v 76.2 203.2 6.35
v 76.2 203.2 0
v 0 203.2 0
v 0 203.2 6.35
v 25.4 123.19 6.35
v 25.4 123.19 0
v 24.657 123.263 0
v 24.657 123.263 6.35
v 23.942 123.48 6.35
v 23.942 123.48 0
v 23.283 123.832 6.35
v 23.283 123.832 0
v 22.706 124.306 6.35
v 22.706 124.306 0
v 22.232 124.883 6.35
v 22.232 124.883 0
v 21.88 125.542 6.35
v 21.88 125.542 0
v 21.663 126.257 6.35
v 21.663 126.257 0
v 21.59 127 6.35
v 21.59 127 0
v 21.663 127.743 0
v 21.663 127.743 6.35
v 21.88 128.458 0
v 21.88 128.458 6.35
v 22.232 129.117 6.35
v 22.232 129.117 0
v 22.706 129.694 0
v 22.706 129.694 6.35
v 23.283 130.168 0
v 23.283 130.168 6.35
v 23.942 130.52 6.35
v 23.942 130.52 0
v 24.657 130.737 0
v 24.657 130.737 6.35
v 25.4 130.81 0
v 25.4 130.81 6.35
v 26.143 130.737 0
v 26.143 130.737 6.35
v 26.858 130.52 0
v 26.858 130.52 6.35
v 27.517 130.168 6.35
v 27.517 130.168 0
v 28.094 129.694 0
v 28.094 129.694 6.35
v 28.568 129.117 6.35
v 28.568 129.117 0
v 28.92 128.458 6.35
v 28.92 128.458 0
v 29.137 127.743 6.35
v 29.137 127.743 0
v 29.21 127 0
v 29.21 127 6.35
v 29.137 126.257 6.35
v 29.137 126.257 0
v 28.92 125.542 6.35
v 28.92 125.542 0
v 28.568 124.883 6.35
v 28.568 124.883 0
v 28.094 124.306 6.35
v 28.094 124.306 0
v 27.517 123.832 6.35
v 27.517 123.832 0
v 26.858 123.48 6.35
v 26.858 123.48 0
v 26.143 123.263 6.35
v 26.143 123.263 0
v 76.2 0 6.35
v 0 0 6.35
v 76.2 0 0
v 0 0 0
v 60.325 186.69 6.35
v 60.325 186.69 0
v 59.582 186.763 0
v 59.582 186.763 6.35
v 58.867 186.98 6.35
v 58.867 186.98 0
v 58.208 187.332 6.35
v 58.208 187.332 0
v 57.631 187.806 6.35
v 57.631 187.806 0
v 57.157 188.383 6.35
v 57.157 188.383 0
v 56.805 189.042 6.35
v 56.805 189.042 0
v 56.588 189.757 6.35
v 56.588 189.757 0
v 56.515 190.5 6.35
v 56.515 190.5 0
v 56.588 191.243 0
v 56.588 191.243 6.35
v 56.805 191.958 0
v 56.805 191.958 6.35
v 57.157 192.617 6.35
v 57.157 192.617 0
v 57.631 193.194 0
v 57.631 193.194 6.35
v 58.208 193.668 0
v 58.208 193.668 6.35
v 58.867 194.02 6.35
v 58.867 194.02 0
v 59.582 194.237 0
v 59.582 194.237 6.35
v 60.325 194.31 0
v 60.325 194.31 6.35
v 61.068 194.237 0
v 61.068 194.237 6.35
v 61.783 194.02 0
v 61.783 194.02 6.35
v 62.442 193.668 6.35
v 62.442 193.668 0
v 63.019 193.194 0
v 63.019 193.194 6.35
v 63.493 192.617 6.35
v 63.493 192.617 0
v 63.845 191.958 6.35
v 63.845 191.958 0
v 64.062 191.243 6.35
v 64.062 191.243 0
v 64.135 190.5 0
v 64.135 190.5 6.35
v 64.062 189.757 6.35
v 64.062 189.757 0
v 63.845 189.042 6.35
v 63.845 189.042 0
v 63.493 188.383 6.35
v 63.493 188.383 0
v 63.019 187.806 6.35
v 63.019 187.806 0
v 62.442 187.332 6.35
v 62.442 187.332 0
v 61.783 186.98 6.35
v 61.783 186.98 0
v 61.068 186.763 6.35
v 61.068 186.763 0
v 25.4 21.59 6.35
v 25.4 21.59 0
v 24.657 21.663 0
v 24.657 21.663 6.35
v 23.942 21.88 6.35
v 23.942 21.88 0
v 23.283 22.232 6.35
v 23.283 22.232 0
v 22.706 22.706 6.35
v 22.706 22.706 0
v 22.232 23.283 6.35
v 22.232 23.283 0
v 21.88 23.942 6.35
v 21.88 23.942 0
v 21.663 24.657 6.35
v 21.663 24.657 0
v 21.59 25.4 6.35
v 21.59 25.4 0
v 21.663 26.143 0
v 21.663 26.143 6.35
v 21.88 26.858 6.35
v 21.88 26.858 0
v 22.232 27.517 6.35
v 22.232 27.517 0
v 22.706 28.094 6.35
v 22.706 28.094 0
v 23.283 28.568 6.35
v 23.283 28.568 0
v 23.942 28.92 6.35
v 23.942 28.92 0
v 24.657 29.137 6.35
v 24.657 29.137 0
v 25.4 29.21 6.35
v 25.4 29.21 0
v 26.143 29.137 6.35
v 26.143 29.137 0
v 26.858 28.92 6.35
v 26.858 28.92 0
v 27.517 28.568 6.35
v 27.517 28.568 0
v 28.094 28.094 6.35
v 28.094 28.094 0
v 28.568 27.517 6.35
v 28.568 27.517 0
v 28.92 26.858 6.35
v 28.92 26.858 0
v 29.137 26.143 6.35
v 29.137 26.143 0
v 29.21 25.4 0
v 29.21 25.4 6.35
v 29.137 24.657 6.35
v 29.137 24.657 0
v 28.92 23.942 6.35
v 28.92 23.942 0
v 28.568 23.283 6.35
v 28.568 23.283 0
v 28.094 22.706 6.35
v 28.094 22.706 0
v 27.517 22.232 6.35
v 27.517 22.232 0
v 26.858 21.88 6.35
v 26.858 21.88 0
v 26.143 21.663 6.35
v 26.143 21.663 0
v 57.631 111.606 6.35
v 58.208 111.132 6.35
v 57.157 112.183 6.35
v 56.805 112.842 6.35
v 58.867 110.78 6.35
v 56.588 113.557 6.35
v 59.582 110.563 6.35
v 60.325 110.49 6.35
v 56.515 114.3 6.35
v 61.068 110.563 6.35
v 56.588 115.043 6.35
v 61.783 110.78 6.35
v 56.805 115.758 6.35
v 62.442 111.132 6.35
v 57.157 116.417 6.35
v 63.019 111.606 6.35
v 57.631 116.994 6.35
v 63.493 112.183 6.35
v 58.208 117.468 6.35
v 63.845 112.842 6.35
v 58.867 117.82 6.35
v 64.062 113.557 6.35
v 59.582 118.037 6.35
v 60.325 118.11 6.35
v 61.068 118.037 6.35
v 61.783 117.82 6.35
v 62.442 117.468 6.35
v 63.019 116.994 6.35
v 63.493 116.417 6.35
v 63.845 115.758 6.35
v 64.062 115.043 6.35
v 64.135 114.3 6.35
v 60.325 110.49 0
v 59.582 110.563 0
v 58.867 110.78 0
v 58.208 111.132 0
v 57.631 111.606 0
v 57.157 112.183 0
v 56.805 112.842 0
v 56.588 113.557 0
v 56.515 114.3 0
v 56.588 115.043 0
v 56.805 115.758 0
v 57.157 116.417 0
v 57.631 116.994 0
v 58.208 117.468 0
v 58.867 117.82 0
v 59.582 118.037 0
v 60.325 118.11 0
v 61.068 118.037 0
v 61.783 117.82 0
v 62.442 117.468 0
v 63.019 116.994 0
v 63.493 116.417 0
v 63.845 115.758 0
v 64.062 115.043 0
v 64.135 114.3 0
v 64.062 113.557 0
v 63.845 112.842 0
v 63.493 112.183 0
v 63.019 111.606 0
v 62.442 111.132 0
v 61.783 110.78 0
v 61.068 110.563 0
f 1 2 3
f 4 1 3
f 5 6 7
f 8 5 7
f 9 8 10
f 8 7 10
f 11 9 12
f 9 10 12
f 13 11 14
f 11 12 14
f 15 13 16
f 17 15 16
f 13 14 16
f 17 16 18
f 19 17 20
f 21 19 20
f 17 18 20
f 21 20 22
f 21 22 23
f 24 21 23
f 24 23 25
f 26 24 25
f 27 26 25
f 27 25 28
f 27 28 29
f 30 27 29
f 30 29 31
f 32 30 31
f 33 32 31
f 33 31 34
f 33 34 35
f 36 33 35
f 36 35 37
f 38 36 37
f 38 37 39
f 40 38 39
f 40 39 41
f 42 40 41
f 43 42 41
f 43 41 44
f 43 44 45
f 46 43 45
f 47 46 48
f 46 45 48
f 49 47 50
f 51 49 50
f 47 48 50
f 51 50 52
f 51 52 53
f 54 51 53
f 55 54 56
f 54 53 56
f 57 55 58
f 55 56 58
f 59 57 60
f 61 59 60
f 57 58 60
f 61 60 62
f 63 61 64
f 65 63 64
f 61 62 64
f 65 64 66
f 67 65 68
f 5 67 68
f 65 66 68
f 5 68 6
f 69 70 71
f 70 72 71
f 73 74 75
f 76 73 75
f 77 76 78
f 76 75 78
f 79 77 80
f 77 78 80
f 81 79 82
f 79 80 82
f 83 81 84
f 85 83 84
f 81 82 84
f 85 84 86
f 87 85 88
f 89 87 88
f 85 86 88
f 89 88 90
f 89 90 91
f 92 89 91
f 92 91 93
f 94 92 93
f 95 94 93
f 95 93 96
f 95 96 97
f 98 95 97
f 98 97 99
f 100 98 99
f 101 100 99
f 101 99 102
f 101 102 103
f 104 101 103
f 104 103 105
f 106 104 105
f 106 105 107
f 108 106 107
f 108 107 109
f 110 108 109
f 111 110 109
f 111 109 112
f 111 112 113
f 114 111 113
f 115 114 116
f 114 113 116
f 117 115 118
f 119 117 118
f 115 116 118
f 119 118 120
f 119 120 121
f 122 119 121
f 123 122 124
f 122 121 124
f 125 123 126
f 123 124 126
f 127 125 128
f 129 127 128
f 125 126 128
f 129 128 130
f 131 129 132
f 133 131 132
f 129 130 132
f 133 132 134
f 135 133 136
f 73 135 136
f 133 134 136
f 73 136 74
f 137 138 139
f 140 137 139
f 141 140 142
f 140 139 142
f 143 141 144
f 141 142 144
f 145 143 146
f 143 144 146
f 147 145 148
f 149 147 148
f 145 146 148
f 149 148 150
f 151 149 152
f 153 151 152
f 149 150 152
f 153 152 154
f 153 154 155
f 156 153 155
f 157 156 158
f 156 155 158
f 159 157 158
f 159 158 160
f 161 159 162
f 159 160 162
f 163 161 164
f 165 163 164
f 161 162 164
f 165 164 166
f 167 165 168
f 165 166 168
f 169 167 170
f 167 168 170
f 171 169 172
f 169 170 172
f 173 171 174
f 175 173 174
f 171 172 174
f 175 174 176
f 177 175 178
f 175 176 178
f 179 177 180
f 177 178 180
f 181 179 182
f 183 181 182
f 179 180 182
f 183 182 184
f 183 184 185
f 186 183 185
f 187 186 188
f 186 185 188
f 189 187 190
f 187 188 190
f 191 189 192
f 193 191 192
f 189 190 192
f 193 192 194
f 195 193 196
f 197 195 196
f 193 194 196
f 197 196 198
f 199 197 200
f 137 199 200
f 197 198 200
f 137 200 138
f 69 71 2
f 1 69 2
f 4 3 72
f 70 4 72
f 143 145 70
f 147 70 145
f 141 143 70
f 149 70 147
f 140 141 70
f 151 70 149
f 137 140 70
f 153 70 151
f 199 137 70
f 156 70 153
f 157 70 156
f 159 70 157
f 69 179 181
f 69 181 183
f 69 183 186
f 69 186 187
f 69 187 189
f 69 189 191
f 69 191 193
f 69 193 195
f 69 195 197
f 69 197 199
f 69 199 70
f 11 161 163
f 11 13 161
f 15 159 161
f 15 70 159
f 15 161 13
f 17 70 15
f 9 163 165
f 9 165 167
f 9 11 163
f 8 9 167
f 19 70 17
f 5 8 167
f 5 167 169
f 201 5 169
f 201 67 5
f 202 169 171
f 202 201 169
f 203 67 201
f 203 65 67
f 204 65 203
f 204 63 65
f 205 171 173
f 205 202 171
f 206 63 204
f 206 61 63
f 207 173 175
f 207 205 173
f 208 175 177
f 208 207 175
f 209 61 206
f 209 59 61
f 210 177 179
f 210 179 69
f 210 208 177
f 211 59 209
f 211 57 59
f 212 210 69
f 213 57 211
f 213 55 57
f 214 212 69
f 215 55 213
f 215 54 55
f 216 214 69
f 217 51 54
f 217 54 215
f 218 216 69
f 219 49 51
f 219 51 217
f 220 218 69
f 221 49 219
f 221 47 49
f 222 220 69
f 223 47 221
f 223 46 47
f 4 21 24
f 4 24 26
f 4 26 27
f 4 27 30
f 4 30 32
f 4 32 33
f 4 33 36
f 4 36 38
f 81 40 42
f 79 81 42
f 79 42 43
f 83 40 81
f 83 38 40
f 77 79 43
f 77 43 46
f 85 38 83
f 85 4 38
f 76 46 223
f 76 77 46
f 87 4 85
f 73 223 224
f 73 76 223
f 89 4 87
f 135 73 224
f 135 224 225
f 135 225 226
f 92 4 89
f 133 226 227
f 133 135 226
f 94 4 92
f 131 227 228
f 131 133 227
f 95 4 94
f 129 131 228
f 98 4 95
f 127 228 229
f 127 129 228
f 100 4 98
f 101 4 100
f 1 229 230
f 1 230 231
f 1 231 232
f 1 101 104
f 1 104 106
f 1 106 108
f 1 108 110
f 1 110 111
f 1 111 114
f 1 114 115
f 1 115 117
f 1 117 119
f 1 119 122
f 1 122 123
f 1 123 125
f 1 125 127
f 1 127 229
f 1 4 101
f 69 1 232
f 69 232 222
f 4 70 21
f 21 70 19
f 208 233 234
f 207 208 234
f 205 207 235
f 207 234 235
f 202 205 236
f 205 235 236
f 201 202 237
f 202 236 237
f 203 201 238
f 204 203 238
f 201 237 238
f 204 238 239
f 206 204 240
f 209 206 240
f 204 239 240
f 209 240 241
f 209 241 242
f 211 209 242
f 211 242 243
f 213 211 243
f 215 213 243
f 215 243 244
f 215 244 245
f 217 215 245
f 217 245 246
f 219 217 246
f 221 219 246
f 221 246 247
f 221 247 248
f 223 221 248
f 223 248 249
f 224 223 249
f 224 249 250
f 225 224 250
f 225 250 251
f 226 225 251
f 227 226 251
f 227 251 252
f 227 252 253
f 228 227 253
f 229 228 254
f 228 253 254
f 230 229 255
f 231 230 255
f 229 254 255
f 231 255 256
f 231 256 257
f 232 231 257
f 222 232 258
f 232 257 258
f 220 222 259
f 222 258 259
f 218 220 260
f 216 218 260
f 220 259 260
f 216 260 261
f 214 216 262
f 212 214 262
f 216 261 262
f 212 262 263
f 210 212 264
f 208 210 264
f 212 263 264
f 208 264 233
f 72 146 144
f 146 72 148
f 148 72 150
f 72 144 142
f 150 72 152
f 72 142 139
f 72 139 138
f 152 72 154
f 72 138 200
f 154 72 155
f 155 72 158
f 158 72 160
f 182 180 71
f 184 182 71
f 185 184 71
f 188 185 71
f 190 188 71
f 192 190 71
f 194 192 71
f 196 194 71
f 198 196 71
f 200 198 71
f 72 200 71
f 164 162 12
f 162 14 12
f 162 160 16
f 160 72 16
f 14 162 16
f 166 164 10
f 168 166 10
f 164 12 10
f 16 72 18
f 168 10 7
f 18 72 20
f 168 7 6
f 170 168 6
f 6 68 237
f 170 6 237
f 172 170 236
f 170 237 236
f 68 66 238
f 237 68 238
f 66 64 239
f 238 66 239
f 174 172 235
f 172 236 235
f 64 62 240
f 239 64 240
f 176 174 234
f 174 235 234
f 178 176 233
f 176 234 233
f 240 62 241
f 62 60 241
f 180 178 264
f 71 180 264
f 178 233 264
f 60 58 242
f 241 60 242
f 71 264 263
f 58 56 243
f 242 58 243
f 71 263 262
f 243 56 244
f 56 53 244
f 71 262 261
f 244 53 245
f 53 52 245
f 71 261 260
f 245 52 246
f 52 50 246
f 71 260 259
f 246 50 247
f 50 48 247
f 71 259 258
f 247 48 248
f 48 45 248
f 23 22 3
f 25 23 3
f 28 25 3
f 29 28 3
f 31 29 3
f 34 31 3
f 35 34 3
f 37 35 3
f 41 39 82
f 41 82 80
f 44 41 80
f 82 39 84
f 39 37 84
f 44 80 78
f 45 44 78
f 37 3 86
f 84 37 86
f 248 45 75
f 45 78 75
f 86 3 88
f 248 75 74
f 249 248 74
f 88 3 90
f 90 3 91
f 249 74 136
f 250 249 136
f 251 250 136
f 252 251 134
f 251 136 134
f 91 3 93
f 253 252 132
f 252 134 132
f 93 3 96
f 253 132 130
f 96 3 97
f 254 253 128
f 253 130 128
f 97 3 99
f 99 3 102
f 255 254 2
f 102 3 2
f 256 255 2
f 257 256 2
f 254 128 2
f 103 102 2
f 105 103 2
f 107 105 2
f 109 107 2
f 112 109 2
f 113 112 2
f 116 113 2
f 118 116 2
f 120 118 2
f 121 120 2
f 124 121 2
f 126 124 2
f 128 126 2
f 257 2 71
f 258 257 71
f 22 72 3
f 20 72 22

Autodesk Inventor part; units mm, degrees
ref_plane "YZ Plane" through (0, 0, 0) normal (1, 0, 0) x (0, 1, 0)
ref_plane "XZ Plane" through (0, 0, 0) normal (0, 1, 0) x (-1, 0, 0)
ref_plane "XY Plane" through (0, 0, 0) normal (0, 0, 1) x (1, 0, 0)
sketch "Sketch1" plane through (0, 0, 0) normal (0, 0, 1) x (1, 0, 0)
  line L0 (0, 0) -> (76.2, 0)
  line L1 (76.2, 0) -> (76.2, 203.2)
  line L2 (76.2, 203.2) -> (0, 203.2)
  line L3 (0, 203.2) -> (0, 0)
  dimension "d0" = 76.2
  dimension "d1" = 203.2
extrude "Extrusion1" add sketch "Sketch1" along normal blind 6.35
sketch "Sketch2" plane through (0, 0, 6.35) normal (0, 0, 1) x (1, 0, 0)
  line L0 (0, 0) -> (0, 203.2)
  line L1 (76.2, 0) -> (0, 0)
  line L2 (0, 203.2) -> (76.2, 203.2)
  line L3 (0, 203.2) -> (76.2, 203.2) projected
  line L4 (60.325, 114.3) -> (60.325, 190.5)
  point P0 (25.4, 25.4)
  point P1 (25.4, 127)
  dimension "d4" = 101.6
  dimension "d5" = 25.4
  dimension "d6" = 25.4
  dimension "d7" = 76.2
  dimension "d17" = 34.925
  dimension "d18" = 190.5
hole "Hole1" at (25.4, 25.4, 6.35) at (25.4, 127, 6.35) at (60.325, 190.5, 6.35) at (60.325, 114.3, 6.35) direction (0, 0, -1) diameter 7.62 end through all
properties part number "back frame plate"
